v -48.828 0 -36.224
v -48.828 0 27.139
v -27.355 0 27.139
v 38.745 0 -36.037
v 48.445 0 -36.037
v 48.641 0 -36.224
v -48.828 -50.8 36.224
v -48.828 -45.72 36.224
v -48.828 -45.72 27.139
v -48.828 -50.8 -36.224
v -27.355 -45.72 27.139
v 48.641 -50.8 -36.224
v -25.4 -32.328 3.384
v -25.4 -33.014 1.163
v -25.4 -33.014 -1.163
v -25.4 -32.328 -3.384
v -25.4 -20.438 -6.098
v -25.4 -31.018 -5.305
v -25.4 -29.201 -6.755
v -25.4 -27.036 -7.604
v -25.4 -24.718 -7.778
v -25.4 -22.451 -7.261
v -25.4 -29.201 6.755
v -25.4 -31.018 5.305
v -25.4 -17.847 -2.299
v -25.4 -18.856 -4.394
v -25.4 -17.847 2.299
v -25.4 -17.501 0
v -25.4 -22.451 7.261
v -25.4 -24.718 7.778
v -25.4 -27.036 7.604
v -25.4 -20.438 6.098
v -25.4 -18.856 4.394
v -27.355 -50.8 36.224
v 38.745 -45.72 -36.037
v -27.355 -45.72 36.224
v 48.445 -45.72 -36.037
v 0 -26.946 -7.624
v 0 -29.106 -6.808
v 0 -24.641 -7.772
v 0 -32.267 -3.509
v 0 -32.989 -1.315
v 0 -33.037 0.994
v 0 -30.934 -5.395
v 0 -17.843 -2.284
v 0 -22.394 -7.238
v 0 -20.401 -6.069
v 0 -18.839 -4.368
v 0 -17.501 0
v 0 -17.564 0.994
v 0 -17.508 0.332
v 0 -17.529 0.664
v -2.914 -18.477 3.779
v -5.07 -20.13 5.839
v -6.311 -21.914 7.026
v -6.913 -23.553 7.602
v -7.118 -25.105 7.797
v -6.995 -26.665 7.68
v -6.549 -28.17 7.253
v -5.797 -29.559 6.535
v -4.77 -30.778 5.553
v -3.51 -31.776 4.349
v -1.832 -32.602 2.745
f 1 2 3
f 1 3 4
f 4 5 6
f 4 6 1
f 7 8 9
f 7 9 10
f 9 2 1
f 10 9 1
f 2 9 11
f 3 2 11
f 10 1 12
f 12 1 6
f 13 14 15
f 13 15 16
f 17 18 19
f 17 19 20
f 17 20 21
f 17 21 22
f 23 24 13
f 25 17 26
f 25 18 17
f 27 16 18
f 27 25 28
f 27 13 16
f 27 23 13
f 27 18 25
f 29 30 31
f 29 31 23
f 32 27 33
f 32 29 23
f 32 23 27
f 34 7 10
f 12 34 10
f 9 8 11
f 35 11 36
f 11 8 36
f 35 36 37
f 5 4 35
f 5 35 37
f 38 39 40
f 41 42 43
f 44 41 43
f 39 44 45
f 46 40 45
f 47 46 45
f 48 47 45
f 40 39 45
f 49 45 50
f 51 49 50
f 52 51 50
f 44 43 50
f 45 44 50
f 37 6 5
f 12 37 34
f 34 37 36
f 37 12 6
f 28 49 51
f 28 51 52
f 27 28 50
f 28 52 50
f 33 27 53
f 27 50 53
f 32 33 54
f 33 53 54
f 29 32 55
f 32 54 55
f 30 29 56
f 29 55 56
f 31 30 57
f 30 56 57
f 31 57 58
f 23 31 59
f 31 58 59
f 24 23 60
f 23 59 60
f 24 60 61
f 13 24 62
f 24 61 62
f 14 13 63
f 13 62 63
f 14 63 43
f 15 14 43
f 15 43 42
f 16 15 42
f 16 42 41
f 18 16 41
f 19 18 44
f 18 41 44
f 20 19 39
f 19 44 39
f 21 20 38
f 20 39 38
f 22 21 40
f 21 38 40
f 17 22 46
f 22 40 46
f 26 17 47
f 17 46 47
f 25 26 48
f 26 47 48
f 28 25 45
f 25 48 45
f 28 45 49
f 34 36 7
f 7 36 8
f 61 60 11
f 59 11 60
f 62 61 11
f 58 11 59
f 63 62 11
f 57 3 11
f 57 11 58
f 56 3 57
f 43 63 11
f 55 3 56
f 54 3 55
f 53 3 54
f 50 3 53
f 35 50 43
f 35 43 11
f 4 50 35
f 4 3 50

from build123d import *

# Parameters (mm, degrees)
F1_DEPTH = 50.8
F3_DEPTH = 45.72
F4_R     = 7.799938
F5_DEPTH = 25.4


with BuildPart() as f1:
    # F0 (on Front) → F1 (new body)
    with BuildSketch(Plane.XZ):
        Polygon((-27.354645, 36.2239), (-48.827574, 36.2239), (-48.827574, -36.2239), (48.640851, -36.2239), align=None)
    extrude(amount=F1_DEPTH)

    # F2 (on Front) → F3 (cut)
    with BuildSketch(Plane.XZ):
        Polygon((-27.354645, 36.597338), (-48.827574, 36.597338), (-48.827574, 27.138793), (-27.354645, 27.138793), (38.744636, -36.037177), (48.640851, -36.037177), align=None)
    extrude(amount=F3_DEPTH, mode=Mode.SUBTRACT)

    # F4 (on Right) → F5 (cut)
    with BuildSketch(Plane.YZ):
        with Locations((-25.300711, 0)):
            Circle(F4_R)
    extrude(amount=-F5_DEPTH, mode=Mode.SUBTRACT)


solid = f1.part
